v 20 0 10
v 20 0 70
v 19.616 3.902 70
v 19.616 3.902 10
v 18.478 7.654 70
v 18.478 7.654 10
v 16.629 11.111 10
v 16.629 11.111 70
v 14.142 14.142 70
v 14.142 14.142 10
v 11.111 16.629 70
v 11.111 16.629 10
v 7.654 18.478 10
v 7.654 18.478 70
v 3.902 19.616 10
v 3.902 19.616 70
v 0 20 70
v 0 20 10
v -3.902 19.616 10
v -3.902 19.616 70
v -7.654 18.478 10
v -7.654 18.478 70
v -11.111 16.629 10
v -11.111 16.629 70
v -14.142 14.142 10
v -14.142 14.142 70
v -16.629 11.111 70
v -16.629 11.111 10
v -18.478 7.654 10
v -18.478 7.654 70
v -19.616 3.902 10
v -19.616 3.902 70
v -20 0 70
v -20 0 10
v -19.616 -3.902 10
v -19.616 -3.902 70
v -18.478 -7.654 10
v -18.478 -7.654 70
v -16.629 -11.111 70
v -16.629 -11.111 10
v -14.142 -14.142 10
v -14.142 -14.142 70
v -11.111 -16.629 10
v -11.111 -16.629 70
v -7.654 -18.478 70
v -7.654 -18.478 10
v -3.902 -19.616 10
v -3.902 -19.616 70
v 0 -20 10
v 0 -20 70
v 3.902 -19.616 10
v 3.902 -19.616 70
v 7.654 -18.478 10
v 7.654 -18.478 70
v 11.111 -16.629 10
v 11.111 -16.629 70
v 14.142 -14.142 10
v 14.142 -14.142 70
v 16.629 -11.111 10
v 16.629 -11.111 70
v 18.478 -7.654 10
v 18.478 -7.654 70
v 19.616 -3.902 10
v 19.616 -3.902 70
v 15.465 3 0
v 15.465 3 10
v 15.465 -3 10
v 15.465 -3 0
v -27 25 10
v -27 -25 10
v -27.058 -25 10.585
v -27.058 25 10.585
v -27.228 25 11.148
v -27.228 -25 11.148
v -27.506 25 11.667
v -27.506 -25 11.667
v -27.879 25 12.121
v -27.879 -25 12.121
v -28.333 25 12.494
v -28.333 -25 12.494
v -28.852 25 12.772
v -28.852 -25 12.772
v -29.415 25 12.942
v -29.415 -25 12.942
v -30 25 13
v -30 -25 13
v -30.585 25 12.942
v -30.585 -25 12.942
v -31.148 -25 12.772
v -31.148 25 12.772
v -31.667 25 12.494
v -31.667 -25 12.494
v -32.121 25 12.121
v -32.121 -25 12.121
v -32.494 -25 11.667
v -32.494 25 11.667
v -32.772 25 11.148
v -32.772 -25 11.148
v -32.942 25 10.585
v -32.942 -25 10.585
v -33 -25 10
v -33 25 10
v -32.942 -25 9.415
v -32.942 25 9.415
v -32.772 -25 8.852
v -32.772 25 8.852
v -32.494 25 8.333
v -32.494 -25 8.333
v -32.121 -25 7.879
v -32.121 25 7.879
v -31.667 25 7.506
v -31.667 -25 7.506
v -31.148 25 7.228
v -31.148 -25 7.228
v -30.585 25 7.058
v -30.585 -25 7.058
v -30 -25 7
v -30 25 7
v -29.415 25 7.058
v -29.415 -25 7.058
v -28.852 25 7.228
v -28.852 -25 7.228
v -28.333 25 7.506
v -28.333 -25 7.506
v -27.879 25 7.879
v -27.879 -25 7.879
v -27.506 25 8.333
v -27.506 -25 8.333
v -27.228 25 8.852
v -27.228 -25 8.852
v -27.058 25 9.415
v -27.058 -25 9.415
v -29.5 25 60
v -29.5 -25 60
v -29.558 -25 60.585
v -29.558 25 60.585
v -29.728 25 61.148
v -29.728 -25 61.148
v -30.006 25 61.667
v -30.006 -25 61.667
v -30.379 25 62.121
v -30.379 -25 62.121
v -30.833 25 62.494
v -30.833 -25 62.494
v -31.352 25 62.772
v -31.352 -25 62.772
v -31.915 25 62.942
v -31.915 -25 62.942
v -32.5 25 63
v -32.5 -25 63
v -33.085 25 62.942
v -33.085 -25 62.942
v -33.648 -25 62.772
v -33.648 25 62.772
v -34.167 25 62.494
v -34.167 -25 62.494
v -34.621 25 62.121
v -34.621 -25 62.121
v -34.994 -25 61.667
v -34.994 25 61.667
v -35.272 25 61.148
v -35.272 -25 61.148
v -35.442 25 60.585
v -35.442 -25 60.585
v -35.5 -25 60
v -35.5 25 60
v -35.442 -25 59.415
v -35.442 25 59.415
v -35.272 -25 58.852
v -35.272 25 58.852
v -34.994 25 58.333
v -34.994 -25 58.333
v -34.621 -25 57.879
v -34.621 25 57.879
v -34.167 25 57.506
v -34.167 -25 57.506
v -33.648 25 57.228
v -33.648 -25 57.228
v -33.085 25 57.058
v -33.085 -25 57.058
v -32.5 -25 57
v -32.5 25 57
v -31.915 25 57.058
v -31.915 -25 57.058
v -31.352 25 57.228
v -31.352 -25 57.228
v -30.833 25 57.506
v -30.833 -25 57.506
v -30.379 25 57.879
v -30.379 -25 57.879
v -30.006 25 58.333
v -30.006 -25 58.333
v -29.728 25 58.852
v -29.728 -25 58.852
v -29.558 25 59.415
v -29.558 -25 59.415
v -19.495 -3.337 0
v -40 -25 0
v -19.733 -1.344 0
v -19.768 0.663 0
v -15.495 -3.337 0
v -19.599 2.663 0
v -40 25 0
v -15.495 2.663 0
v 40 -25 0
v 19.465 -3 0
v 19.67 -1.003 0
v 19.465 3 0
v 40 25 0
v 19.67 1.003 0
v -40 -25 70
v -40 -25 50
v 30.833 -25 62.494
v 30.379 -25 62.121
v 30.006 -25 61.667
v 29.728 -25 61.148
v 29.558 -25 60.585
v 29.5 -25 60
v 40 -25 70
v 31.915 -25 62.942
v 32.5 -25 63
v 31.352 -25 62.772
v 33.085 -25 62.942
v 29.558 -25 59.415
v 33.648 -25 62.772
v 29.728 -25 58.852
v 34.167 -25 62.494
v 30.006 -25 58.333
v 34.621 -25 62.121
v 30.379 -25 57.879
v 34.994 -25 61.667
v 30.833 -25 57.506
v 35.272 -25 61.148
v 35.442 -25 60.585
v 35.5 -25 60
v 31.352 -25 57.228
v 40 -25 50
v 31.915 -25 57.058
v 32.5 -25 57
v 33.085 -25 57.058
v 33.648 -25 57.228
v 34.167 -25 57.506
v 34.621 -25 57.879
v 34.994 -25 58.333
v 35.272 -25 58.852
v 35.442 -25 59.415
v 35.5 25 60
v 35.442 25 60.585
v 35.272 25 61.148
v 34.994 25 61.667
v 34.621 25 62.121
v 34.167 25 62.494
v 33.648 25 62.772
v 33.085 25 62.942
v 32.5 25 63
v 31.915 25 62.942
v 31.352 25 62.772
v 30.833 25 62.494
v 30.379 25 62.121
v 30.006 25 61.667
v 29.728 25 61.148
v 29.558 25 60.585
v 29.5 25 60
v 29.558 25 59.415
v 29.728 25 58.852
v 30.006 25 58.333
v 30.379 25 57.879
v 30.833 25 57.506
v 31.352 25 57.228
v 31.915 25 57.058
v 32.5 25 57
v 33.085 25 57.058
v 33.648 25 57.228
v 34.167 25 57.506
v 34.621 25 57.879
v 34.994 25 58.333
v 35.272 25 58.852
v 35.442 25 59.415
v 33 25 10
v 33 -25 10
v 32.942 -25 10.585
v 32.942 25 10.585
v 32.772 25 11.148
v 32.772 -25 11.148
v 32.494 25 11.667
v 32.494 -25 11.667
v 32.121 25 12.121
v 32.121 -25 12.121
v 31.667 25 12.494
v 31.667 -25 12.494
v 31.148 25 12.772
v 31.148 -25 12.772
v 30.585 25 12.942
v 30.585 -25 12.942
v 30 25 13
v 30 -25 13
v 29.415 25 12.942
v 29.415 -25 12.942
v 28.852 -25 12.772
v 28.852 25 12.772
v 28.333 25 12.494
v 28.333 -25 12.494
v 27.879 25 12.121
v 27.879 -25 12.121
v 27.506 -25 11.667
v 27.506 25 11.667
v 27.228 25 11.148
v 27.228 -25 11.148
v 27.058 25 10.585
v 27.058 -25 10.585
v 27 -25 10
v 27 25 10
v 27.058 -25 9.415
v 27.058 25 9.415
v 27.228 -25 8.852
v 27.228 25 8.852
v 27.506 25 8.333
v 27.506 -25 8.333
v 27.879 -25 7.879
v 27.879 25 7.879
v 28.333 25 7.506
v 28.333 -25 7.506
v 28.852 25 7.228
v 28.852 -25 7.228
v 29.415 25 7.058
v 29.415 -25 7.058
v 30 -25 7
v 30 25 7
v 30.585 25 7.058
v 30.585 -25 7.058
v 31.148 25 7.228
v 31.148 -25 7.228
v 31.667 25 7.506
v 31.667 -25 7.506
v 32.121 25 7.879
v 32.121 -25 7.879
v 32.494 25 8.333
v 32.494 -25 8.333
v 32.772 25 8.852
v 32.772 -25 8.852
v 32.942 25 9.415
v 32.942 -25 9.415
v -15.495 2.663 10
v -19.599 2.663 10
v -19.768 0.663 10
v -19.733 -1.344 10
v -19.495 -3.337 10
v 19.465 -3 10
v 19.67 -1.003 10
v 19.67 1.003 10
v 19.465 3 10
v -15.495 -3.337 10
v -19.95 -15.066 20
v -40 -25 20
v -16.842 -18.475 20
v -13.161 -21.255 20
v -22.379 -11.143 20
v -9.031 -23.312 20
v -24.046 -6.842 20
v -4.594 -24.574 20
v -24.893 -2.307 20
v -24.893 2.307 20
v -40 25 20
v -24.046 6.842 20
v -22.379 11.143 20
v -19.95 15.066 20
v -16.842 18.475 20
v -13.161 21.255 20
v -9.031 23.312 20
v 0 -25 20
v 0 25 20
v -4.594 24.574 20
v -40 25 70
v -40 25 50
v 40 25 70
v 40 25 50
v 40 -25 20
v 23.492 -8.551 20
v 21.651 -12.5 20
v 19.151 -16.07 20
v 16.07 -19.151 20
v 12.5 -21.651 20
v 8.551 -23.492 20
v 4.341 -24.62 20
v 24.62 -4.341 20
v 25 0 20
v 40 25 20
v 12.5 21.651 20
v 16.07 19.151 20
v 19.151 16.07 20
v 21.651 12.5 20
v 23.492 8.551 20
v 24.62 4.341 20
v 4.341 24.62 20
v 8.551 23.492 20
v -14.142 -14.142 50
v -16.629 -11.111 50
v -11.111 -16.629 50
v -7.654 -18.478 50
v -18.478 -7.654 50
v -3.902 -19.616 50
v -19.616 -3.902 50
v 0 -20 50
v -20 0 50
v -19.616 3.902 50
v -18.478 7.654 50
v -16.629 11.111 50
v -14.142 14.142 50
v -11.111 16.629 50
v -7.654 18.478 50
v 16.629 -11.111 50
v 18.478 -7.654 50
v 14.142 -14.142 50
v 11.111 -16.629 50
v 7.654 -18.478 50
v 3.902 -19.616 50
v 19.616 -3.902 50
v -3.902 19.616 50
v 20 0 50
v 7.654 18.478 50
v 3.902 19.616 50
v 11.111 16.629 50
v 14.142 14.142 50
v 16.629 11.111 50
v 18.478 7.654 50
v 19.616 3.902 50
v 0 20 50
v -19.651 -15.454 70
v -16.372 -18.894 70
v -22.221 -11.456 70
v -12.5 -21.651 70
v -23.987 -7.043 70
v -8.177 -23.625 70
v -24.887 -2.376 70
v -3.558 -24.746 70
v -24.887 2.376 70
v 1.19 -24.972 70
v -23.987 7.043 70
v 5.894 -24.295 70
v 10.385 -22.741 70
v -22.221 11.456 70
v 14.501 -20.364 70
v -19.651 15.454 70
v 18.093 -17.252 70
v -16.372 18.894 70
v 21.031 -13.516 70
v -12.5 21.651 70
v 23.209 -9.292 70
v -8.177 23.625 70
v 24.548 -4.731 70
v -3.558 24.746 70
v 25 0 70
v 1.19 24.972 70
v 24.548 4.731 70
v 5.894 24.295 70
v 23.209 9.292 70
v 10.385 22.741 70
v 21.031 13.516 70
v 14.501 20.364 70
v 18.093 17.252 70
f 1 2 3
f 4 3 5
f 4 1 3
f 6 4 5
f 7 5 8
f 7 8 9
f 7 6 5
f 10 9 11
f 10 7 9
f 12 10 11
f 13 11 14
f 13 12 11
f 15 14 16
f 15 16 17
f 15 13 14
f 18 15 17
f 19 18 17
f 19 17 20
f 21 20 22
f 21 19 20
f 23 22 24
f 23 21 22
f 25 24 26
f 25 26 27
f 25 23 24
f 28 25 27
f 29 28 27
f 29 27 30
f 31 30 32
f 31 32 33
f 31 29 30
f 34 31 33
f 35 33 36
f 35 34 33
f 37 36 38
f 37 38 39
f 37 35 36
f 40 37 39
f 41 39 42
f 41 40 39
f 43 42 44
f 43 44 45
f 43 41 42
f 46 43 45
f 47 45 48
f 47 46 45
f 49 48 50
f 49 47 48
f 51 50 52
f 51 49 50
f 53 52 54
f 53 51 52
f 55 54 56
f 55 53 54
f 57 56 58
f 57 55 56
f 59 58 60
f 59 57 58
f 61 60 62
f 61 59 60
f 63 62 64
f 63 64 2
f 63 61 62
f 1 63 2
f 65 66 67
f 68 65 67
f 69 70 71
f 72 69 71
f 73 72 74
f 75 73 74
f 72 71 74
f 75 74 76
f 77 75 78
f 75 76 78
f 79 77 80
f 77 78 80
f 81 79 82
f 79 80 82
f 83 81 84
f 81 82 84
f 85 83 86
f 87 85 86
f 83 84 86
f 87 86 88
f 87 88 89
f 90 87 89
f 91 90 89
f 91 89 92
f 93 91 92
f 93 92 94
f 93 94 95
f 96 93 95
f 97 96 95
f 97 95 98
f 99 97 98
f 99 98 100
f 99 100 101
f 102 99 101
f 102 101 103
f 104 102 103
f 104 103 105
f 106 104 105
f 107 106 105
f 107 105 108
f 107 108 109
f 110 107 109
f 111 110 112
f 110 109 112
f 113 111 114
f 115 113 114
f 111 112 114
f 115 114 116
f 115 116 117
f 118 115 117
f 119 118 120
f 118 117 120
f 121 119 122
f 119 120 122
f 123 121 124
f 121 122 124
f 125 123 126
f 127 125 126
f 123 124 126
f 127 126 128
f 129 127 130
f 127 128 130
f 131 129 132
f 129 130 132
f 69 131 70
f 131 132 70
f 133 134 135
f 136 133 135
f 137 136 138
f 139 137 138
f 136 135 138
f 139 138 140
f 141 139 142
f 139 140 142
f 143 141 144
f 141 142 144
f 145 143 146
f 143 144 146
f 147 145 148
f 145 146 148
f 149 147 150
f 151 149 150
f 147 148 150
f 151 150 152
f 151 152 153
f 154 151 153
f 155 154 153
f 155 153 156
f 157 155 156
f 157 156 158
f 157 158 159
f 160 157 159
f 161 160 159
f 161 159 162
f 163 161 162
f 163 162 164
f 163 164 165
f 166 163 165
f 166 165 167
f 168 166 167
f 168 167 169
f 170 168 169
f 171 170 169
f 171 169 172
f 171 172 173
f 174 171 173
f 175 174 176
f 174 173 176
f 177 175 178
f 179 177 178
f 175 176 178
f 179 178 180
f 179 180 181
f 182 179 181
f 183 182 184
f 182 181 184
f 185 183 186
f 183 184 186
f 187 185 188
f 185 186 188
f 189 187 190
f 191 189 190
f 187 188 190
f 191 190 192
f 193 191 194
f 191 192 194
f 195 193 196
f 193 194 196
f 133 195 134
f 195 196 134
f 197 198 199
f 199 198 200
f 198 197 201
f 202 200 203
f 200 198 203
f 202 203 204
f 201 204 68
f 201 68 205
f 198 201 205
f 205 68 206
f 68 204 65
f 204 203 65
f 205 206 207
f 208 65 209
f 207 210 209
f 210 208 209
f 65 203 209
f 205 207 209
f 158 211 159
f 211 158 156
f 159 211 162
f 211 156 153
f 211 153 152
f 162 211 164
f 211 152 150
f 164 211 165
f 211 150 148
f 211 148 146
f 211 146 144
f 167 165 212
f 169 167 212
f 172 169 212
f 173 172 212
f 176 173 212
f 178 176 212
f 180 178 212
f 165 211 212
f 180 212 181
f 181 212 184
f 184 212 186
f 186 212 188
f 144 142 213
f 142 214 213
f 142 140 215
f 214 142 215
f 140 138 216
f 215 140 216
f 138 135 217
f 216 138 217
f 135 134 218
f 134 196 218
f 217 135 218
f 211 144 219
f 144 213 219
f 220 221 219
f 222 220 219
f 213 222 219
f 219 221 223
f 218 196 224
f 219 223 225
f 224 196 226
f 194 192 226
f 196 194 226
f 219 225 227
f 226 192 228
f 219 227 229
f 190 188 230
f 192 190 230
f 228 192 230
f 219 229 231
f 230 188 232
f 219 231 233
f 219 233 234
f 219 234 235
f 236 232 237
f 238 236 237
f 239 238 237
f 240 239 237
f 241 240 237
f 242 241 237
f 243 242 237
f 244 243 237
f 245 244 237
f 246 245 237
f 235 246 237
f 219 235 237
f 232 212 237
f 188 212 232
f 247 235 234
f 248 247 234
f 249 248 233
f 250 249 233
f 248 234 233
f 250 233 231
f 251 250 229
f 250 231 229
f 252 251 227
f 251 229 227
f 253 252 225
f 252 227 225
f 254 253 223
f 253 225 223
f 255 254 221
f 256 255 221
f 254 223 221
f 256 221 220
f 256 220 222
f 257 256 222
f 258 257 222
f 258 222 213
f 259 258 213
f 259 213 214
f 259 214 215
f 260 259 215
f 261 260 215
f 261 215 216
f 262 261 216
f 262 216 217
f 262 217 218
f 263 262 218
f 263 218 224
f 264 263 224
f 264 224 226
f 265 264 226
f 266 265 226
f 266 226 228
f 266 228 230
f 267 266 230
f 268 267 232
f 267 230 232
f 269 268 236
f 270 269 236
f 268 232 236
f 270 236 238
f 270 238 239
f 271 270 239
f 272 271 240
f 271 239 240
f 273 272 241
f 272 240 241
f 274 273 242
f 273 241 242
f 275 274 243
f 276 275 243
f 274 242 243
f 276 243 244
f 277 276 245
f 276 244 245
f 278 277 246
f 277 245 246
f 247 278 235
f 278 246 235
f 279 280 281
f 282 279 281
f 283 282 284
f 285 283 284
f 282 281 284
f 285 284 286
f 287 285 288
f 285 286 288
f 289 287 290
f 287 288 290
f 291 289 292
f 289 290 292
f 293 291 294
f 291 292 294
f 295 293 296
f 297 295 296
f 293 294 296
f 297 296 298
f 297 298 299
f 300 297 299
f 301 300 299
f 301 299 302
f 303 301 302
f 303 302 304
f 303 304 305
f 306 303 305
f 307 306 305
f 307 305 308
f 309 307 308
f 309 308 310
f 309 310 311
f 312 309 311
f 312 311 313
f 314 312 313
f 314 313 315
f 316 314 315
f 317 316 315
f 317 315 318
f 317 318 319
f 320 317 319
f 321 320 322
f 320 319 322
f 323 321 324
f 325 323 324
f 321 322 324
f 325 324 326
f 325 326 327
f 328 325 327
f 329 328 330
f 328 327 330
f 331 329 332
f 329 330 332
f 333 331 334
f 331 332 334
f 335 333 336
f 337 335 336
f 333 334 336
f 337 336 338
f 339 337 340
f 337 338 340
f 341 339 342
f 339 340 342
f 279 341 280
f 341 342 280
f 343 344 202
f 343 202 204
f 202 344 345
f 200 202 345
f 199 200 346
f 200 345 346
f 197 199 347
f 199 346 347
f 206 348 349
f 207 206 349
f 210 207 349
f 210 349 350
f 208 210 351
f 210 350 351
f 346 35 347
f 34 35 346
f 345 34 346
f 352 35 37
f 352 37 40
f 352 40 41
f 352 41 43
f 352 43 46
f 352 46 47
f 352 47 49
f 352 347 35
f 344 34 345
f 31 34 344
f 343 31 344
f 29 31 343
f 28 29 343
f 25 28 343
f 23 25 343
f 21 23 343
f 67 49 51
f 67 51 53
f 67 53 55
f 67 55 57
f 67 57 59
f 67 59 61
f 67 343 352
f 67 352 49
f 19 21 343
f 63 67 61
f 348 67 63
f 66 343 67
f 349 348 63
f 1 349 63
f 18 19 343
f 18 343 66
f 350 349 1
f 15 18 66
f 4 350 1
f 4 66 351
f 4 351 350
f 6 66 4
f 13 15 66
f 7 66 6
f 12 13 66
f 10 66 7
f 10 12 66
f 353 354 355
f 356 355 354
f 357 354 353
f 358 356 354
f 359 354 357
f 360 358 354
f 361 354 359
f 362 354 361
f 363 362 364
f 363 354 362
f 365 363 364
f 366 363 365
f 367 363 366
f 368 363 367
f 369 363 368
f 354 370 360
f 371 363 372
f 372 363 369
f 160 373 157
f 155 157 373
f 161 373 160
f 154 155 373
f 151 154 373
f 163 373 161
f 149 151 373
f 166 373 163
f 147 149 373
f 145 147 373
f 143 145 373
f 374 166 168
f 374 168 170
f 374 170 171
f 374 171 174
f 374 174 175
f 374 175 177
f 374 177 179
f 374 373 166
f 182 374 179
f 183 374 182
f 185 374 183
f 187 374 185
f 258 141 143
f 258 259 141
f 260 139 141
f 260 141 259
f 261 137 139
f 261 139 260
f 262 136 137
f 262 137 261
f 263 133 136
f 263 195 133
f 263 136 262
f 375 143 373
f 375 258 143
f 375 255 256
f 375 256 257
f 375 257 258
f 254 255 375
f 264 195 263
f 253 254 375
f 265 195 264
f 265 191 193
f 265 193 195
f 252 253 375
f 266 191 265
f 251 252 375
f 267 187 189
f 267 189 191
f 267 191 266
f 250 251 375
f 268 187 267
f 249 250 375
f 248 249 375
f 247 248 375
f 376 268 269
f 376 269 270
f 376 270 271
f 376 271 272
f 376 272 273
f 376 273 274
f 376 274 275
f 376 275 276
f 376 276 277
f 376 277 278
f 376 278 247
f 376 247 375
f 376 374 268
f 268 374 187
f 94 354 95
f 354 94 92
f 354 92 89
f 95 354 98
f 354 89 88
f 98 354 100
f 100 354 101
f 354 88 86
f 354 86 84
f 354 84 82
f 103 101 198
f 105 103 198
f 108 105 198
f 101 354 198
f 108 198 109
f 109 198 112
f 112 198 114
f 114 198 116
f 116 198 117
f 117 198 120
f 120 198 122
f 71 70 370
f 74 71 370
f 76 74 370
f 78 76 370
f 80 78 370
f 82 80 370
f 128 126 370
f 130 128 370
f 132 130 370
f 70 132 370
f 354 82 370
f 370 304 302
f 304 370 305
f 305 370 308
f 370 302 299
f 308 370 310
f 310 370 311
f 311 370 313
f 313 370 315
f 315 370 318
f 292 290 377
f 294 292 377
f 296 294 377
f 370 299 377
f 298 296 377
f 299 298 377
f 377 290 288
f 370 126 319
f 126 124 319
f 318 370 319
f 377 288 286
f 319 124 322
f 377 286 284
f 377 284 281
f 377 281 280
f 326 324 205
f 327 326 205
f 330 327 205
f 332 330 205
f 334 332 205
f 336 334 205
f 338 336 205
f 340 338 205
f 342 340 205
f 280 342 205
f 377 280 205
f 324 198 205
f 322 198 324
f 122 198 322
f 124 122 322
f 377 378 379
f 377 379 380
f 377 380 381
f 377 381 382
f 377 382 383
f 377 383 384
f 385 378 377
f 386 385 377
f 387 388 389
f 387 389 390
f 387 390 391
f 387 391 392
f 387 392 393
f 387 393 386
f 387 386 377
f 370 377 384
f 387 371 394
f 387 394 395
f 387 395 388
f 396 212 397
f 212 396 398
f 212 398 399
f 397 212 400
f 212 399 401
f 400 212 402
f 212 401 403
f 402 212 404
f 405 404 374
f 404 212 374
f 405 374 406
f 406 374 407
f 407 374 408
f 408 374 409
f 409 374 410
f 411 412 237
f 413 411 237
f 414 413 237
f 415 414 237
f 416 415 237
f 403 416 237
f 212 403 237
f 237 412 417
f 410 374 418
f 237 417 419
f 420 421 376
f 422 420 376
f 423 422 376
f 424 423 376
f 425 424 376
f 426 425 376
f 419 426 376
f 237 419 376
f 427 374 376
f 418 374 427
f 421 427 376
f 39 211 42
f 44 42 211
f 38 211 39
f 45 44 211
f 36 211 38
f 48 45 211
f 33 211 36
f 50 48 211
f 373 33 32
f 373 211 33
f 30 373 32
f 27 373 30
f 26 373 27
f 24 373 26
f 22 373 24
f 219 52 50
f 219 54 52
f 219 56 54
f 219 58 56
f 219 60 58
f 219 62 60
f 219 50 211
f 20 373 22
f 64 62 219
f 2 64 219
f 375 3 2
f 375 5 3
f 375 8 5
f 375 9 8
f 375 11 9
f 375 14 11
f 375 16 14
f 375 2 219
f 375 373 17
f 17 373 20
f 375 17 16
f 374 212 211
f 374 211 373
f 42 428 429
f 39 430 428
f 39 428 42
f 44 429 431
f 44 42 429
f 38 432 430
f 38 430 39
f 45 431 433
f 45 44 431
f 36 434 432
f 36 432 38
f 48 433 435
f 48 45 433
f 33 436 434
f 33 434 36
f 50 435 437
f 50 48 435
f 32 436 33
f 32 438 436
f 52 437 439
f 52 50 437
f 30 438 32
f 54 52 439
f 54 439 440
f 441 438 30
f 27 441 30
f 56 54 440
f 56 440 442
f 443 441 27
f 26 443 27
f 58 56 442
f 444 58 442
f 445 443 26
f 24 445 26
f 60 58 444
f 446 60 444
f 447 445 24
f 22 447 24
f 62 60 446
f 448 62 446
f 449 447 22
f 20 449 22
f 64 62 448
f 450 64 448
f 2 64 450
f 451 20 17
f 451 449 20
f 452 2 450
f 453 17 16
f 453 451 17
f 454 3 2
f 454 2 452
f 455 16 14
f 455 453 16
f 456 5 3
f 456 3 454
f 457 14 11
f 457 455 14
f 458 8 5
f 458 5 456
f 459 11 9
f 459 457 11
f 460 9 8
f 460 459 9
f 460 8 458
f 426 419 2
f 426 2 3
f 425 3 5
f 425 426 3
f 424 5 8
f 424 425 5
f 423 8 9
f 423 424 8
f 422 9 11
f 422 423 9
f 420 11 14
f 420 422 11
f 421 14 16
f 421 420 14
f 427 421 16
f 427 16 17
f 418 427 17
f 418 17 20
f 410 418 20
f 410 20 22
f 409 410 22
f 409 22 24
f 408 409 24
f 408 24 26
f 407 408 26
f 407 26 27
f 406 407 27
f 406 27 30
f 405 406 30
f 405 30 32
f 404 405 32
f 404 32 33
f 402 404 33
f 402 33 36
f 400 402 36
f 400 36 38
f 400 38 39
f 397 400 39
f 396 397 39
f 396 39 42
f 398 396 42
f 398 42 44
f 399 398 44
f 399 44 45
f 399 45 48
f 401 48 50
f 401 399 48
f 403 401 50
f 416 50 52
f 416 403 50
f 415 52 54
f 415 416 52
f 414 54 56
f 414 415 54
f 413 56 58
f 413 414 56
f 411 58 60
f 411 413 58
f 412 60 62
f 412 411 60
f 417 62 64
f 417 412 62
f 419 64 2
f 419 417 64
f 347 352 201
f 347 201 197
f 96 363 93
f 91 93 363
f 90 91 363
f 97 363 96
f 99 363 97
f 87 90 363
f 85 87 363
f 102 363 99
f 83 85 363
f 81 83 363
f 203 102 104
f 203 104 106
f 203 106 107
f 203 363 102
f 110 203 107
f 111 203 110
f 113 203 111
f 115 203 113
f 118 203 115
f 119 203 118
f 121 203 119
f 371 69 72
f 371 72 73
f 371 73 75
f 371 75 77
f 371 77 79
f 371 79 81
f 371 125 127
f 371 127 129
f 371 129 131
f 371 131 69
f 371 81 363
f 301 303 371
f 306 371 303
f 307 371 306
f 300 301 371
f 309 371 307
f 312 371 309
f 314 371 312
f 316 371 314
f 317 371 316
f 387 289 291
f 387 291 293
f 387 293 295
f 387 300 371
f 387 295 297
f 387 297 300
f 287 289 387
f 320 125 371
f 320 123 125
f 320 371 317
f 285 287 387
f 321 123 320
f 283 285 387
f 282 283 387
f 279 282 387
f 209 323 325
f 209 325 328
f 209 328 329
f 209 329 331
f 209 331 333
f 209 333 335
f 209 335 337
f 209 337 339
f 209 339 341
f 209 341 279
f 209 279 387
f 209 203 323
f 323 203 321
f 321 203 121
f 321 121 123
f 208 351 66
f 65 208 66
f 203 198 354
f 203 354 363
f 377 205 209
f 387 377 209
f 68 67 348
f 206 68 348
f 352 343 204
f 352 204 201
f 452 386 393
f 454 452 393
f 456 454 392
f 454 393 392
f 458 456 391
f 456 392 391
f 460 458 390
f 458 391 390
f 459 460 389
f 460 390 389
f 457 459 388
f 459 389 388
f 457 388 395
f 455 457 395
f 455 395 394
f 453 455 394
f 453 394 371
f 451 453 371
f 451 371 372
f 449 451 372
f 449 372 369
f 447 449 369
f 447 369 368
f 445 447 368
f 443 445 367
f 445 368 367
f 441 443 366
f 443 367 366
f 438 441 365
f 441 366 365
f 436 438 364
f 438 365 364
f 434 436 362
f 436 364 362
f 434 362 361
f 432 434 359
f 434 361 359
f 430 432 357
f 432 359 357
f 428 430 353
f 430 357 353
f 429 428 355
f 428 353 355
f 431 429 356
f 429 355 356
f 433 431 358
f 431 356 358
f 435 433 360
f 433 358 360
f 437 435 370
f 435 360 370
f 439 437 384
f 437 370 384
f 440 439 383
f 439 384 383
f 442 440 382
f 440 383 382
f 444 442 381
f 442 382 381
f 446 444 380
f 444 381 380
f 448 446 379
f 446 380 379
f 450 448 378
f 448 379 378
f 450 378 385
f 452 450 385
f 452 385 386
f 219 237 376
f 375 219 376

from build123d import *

# Parameters (mm, degrees)
CYLINDER001_R     = 25
CYLINDER001_DEPTH = 70
BOX_W             = 80
BOX_H             = 50
BOX_DEPTH         = 20
CYLINDER_R        = 20
CYLINDER_DEPTH    = 60
SKETCH_R          = 3
POCKET_DEPTH      = 50.001
POCKET001_DEPTH   = 10.001
BOX001_W          = 80
BOX001_H          = 50
BOX001_DEPTH      = 20
SKETCH002_R       = 3
POCKET002_DEPTH   = 50.001


with BuildPart() as cylinder001:
    # Cylinder001 → Cylinder001 (new body)
    with BuildSketch(Plane.XY):
        Circle(CYLINDER001_R)
    extrude(amount=CYLINDER001_DEPTH)


with BuildPart() as cut001:
    # Box → Box (new body)
    with BuildSketch(Plane(origin=(-40, -25, 0), x_dir=(1, 0, 0), z_dir=(0, 0, 1))):
        with Locations((40, 25)):
            Rectangle(BOX_W, BOX_H)
    extrude(amount=BOX_DEPTH)

    # Cut001: cut Cylinder001
    add(cylinder001.part, mode=Mode.SUBTRACT)


with BuildPart() as cylinder:
    # Cylinder → Cylinder (new body)
    with BuildSketch(Plane.XY.offset(10)):
        Circle(CYLINDER_R)
    extrude(amount=CYLINDER_DEPTH)


with BuildPart() as pocket001:
    # Cut base: copy of Cylinder001
    add(cylinder001.part)

    # Cut: cut Cylinder
    add(cylinder.part, mode=Mode.SUBTRACT)

    # Fusion: union Cut001
    add(cut001.part)

    # Sketch → Pocket (cut, through all)
    with BuildSketch(Plane.XZ.offset(25)):
        with Locations((-30, 10)):
            Circle(SKETCH_R)
        with Locations((30, 10)):
            Circle(SKETCH_R)
    extrude(amount=-POCKET_DEPTH, mode=Mode.SUBTRACT)

    # Sketch001 → Pocket001 (cut, through all)
    with BuildSketch(Plane.XY.offset(10)):
        with BuildLine():
            Line((-19.598788, 2.663334), (-15.495448, 2.663334))
            Line((-15.495448, 2.663334), (-15.495448, -3.336666))
            Line((-15.495448, -3.336666), (-19.495448, -3.336666))
            ThreePointArc((-19.598788, 2.663334), (-19.775991, -0.340608), (-19.495448, -3.336666))
        make_face()
        with BuildLine():
            Line((19.465373, 3), (15.465373, 3))
            Line((15.465373, 3), (15.465373, -3))
            Line((15.465373, -3), (19.465373, -3))
            ThreePointArc((19.465373, -3), (19.695196, 0), (19.465373, 3))
        make_face()
    extrude(amount=-POCKET001_DEPTH, mode=Mode.SUBTRACT)


with BuildPart() as pocket002:
    # Box001 → Box001 (new body)
    with BuildSketch(Plane(origin=(-40, -25, 50), x_dir=(1, 0, 0), z_dir=(0, 0, 1))):
        with Locations((40, 25)):
            Rectangle(BOX001_W, BOX001_H)
    extrude(amount=BOX001_DEPTH)

    # Cut002: cut Cylinder
    add(cylinder.part, mode=Mode.SUBTRACT)

    # Sketch002 → Pocket002 (cut, through all)
    with BuildSketch(Plane.XZ.offset(25)):
        with Locations((-32.5, 60)):
            Circle(SKETCH002_R)
        with Locations((32.5, 60)):
            Circle(SKETCH002_R)
    extrude(amount=-POCKET002_DEPTH, mode=Mode.SUBTRACT)


solid = Compound([pocket001.part, pocket002.part])
